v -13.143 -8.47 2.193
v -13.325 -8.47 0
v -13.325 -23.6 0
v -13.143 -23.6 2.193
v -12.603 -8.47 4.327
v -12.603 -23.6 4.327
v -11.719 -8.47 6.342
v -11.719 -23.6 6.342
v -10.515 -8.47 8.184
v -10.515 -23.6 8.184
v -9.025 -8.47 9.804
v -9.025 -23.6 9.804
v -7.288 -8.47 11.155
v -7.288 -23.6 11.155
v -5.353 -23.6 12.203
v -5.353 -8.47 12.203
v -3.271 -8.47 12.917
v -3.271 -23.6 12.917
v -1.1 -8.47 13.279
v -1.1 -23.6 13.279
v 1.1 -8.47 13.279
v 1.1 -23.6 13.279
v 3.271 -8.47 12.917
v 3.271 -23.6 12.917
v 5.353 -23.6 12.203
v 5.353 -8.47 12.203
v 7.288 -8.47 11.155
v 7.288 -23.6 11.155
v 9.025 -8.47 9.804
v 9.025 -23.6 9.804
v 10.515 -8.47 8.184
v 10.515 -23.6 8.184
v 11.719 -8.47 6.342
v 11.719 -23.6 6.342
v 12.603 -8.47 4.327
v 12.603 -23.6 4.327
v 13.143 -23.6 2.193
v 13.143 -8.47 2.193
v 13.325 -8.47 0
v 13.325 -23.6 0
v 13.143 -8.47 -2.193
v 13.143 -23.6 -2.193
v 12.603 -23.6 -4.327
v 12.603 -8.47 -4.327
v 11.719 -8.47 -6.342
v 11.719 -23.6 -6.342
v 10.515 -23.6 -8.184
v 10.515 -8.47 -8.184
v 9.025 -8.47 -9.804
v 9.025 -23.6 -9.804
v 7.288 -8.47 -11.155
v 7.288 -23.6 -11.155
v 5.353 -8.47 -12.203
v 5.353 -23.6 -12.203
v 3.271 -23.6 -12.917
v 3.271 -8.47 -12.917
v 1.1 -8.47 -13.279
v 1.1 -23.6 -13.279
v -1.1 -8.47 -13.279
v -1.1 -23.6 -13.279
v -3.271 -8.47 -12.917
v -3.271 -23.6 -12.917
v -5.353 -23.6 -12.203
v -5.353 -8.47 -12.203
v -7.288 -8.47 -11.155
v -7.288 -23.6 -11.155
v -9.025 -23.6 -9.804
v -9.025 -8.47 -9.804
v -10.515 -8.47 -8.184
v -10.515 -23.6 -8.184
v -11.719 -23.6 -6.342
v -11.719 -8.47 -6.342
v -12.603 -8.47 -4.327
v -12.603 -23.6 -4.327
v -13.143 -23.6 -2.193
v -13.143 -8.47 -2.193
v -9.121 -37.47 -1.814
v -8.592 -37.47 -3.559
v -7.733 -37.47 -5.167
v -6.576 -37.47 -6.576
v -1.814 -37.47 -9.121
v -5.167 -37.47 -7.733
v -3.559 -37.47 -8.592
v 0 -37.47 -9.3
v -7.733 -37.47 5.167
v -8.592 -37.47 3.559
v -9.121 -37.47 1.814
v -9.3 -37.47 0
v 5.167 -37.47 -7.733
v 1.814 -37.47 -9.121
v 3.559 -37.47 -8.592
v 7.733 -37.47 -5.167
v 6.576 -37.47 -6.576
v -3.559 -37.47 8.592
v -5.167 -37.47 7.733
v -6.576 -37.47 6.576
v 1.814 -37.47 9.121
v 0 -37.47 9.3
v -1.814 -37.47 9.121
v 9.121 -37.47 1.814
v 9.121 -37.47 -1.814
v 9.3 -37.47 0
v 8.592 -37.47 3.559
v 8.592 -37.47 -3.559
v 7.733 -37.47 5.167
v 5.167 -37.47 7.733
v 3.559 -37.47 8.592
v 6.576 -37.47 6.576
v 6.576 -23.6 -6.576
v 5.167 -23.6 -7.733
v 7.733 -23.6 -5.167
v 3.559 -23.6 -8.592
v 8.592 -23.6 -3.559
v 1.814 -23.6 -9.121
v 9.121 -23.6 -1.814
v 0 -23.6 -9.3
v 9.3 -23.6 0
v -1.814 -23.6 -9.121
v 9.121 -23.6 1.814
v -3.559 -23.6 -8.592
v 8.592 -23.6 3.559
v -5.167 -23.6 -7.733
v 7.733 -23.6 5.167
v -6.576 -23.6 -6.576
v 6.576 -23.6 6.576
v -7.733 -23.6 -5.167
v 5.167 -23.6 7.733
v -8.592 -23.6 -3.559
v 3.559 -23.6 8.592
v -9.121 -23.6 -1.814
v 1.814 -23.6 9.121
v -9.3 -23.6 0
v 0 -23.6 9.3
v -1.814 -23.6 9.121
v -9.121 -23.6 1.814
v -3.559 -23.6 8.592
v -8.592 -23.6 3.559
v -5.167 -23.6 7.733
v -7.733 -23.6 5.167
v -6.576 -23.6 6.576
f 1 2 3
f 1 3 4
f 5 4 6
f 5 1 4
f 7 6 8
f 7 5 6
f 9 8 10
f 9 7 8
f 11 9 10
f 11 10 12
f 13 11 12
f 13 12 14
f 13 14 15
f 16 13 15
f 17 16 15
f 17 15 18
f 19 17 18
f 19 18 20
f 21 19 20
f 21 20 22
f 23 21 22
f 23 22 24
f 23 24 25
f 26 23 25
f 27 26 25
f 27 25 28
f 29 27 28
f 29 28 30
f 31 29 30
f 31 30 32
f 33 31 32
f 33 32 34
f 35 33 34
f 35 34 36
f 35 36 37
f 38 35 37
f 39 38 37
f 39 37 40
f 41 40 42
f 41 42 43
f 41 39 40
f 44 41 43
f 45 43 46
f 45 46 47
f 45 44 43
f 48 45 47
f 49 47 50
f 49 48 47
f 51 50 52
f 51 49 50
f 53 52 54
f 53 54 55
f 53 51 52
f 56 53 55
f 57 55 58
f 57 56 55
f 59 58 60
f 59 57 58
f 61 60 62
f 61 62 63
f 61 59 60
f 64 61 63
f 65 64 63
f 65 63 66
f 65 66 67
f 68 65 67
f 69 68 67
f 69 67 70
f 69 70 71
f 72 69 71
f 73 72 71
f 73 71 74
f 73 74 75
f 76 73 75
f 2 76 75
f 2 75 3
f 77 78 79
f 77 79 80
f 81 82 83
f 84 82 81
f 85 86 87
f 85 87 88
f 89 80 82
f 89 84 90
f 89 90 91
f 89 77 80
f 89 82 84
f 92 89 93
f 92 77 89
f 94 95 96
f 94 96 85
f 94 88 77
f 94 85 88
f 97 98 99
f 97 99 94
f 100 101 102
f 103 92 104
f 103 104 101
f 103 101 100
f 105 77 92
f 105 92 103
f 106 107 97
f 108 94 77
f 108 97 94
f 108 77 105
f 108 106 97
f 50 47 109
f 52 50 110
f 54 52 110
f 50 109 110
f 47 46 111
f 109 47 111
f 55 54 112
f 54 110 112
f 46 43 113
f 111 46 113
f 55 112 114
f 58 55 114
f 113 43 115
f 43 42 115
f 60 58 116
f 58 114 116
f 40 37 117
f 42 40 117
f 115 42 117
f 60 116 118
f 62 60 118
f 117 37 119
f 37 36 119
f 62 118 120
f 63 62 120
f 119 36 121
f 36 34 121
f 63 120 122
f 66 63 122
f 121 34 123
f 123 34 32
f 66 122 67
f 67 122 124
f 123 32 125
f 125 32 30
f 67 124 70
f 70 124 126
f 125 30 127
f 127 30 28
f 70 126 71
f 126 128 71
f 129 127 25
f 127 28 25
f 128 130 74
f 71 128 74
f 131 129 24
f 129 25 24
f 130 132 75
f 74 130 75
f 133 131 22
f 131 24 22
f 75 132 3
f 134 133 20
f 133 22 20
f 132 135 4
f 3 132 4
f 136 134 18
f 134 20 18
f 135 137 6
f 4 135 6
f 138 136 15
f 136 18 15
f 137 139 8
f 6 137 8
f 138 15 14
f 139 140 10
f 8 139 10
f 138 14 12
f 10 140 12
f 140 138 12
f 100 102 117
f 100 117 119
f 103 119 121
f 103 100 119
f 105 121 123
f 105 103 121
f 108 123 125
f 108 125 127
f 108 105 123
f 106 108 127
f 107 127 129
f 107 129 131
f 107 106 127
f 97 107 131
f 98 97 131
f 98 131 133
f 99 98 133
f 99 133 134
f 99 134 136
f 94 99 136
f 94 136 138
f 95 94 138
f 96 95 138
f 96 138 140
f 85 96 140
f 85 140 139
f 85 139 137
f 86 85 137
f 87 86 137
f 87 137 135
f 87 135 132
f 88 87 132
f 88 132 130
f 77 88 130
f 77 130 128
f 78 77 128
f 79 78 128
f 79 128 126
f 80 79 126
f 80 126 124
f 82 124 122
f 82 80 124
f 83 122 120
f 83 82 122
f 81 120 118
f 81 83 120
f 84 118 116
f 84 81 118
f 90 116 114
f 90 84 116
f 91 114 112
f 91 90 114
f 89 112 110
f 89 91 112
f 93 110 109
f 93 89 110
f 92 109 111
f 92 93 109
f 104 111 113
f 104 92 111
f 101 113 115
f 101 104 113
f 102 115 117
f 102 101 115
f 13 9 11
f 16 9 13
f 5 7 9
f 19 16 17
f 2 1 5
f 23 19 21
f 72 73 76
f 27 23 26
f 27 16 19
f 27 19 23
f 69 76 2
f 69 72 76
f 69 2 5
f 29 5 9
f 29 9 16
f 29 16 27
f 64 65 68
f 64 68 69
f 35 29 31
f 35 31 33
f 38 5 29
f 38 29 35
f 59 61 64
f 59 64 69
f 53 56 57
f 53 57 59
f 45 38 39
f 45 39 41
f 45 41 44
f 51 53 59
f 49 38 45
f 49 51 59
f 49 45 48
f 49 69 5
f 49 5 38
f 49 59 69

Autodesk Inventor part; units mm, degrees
ref_plane "YZ Plane" through (0, 0, 0) normal (1, 0, 0) x (0, 1, 0)
ref_plane "XZ Plane" through (0, 0, 0) normal (0, 1, 0) x (-1, 0, 0)
sketch "Boceto1" plane through (0, 0, 0) normal (0, 1, 0) x (-1, 0, 0)
  circle A0 centre (0, 0) radius 9
  circle A1 centre (0, 0) radius 13.325
  dimension "d0" = 18
  dimension "d1" = 26.65
extrude "Extrusión1" add sketch "Boceto1" against normal blind 23.6
ref_plane "Plano de trabajo2" through (0, -18.5, 0) normal (0, 1, 0) x (1, 0, 0)
sketch "Boceto4" plane through (0, -18.5, 0) normal (0, 1, 0) x (1, 0, 0)
  circle A0 centre (0, 0) radius 6.8
  dimension "d18" = 13.6
extrude "Extrusión4" add sketch "Boceto4" against normal blind 18.97
sketch "Boceto5" plane through (0, 0, 0) normal (0, 1, 0) x (1, 0, 0)
  circle A0 centre (0, 0) radius 10.7
extrude "Extrusión5" cut sketch "Boceto5" against normal blind 18.97
sketch "Boceto6" plane through (0, -37.47, 0) normal (0, -1, 0) x (1, 0, 0)
  circle A0 centre (0, 0) radius 6.7
  circle A1 centre (0, 0) radius 9.3
  dimension "d25" = 13.4
  dimension "d26" = 18.6
extrude "Extrusión6" add sketch "Boceto6" against normal blind 18.97
sketch "Boceto7" plane through (0, -37.47, 0) normal (0, -1, 0) x (1, 0, 0)
  circle A0 centre (0, 0) radius 8.5
  dimension "d29" = 17
extrude "Extrusión7" cut sketch "Boceto7" against normal blind 18.97
thread "Rosca2" size "M20x2.5" class "6g" standard "ANSI Metric M Profile" full length
sketch "Boceto9" plane through (0, -37.47, 0) normal (0, -1, 0) x (1, 0, 0)
  circle A0 centre (0, 0) radius 9.3
extrude "Extrusión8" cut sketch "Boceto9" along normal blind 8.47
sketch "Boceto10" plane through (0, -23.6, 0) normal (0, -1, 0) x (1, 0, 0)
  circle A0 centre (0, 0) radius 10.7
extrude "Extrusión9" add sketch "Boceto10" against normal blind 1
sketch "Boceto11" plane through (0, -23.6, 0) normal (0, -1, 0) x (1, 0, 0)
  circle A0 centre (0, 0) radius 8.5
extrude "Extrusión10" cut sketch "Boceto11" against normal blind 53.22
sketch "Boceto12" plane through (0, 0, 0) normal (0, 1, 0) x (1, 0, 0)
  circle A0 centre (0, 0) radius 8.5 projected
  circle A1 centre (0, 0) radius 10.7
  circle A2 centre (0, 0) radius 9.3 projected
  circle A3 centre (0, 0) radius 13.88
extrude "Extrusión11" cut sketch "Boceto12" against normal blind 8.47 contours A3
sketch "Boceto13" plane through (0, -8.47, 0) normal (0, 1, 0) x (1, 0, 0)
  circle A0 centre (0, 0) radius 10.7 projected
  circle A1 centre (0, 0) radius 10.7
extrude "Extrusión12" add sketch "Boceto13" against normal up to surface (15.13 mm away)
sketch "Boceto14" plane through (0, -37.47, 0) normal (0, -1, 0) x (1, 0, 0)
  circle A0 centre (0, 0) radius 8.5 projected
  circle A1 centre (0, 0) radius 8.5
extrude "Extrusión13" add sketch "Boceto14" against normal up to surface (13.87 mm away)
sketch "Boceto15" plane through (0, -37.47, 0) normal (0, -1, 0) x (1, 0, 0)
  circle A0 centre (0, 0) radius 9.3 projected
  circle A1 centre (0, 0) radius 9.3
  dimension "d46" = 18.6
properties part number "Acople con rosca" material "PVC, no plastificado"
